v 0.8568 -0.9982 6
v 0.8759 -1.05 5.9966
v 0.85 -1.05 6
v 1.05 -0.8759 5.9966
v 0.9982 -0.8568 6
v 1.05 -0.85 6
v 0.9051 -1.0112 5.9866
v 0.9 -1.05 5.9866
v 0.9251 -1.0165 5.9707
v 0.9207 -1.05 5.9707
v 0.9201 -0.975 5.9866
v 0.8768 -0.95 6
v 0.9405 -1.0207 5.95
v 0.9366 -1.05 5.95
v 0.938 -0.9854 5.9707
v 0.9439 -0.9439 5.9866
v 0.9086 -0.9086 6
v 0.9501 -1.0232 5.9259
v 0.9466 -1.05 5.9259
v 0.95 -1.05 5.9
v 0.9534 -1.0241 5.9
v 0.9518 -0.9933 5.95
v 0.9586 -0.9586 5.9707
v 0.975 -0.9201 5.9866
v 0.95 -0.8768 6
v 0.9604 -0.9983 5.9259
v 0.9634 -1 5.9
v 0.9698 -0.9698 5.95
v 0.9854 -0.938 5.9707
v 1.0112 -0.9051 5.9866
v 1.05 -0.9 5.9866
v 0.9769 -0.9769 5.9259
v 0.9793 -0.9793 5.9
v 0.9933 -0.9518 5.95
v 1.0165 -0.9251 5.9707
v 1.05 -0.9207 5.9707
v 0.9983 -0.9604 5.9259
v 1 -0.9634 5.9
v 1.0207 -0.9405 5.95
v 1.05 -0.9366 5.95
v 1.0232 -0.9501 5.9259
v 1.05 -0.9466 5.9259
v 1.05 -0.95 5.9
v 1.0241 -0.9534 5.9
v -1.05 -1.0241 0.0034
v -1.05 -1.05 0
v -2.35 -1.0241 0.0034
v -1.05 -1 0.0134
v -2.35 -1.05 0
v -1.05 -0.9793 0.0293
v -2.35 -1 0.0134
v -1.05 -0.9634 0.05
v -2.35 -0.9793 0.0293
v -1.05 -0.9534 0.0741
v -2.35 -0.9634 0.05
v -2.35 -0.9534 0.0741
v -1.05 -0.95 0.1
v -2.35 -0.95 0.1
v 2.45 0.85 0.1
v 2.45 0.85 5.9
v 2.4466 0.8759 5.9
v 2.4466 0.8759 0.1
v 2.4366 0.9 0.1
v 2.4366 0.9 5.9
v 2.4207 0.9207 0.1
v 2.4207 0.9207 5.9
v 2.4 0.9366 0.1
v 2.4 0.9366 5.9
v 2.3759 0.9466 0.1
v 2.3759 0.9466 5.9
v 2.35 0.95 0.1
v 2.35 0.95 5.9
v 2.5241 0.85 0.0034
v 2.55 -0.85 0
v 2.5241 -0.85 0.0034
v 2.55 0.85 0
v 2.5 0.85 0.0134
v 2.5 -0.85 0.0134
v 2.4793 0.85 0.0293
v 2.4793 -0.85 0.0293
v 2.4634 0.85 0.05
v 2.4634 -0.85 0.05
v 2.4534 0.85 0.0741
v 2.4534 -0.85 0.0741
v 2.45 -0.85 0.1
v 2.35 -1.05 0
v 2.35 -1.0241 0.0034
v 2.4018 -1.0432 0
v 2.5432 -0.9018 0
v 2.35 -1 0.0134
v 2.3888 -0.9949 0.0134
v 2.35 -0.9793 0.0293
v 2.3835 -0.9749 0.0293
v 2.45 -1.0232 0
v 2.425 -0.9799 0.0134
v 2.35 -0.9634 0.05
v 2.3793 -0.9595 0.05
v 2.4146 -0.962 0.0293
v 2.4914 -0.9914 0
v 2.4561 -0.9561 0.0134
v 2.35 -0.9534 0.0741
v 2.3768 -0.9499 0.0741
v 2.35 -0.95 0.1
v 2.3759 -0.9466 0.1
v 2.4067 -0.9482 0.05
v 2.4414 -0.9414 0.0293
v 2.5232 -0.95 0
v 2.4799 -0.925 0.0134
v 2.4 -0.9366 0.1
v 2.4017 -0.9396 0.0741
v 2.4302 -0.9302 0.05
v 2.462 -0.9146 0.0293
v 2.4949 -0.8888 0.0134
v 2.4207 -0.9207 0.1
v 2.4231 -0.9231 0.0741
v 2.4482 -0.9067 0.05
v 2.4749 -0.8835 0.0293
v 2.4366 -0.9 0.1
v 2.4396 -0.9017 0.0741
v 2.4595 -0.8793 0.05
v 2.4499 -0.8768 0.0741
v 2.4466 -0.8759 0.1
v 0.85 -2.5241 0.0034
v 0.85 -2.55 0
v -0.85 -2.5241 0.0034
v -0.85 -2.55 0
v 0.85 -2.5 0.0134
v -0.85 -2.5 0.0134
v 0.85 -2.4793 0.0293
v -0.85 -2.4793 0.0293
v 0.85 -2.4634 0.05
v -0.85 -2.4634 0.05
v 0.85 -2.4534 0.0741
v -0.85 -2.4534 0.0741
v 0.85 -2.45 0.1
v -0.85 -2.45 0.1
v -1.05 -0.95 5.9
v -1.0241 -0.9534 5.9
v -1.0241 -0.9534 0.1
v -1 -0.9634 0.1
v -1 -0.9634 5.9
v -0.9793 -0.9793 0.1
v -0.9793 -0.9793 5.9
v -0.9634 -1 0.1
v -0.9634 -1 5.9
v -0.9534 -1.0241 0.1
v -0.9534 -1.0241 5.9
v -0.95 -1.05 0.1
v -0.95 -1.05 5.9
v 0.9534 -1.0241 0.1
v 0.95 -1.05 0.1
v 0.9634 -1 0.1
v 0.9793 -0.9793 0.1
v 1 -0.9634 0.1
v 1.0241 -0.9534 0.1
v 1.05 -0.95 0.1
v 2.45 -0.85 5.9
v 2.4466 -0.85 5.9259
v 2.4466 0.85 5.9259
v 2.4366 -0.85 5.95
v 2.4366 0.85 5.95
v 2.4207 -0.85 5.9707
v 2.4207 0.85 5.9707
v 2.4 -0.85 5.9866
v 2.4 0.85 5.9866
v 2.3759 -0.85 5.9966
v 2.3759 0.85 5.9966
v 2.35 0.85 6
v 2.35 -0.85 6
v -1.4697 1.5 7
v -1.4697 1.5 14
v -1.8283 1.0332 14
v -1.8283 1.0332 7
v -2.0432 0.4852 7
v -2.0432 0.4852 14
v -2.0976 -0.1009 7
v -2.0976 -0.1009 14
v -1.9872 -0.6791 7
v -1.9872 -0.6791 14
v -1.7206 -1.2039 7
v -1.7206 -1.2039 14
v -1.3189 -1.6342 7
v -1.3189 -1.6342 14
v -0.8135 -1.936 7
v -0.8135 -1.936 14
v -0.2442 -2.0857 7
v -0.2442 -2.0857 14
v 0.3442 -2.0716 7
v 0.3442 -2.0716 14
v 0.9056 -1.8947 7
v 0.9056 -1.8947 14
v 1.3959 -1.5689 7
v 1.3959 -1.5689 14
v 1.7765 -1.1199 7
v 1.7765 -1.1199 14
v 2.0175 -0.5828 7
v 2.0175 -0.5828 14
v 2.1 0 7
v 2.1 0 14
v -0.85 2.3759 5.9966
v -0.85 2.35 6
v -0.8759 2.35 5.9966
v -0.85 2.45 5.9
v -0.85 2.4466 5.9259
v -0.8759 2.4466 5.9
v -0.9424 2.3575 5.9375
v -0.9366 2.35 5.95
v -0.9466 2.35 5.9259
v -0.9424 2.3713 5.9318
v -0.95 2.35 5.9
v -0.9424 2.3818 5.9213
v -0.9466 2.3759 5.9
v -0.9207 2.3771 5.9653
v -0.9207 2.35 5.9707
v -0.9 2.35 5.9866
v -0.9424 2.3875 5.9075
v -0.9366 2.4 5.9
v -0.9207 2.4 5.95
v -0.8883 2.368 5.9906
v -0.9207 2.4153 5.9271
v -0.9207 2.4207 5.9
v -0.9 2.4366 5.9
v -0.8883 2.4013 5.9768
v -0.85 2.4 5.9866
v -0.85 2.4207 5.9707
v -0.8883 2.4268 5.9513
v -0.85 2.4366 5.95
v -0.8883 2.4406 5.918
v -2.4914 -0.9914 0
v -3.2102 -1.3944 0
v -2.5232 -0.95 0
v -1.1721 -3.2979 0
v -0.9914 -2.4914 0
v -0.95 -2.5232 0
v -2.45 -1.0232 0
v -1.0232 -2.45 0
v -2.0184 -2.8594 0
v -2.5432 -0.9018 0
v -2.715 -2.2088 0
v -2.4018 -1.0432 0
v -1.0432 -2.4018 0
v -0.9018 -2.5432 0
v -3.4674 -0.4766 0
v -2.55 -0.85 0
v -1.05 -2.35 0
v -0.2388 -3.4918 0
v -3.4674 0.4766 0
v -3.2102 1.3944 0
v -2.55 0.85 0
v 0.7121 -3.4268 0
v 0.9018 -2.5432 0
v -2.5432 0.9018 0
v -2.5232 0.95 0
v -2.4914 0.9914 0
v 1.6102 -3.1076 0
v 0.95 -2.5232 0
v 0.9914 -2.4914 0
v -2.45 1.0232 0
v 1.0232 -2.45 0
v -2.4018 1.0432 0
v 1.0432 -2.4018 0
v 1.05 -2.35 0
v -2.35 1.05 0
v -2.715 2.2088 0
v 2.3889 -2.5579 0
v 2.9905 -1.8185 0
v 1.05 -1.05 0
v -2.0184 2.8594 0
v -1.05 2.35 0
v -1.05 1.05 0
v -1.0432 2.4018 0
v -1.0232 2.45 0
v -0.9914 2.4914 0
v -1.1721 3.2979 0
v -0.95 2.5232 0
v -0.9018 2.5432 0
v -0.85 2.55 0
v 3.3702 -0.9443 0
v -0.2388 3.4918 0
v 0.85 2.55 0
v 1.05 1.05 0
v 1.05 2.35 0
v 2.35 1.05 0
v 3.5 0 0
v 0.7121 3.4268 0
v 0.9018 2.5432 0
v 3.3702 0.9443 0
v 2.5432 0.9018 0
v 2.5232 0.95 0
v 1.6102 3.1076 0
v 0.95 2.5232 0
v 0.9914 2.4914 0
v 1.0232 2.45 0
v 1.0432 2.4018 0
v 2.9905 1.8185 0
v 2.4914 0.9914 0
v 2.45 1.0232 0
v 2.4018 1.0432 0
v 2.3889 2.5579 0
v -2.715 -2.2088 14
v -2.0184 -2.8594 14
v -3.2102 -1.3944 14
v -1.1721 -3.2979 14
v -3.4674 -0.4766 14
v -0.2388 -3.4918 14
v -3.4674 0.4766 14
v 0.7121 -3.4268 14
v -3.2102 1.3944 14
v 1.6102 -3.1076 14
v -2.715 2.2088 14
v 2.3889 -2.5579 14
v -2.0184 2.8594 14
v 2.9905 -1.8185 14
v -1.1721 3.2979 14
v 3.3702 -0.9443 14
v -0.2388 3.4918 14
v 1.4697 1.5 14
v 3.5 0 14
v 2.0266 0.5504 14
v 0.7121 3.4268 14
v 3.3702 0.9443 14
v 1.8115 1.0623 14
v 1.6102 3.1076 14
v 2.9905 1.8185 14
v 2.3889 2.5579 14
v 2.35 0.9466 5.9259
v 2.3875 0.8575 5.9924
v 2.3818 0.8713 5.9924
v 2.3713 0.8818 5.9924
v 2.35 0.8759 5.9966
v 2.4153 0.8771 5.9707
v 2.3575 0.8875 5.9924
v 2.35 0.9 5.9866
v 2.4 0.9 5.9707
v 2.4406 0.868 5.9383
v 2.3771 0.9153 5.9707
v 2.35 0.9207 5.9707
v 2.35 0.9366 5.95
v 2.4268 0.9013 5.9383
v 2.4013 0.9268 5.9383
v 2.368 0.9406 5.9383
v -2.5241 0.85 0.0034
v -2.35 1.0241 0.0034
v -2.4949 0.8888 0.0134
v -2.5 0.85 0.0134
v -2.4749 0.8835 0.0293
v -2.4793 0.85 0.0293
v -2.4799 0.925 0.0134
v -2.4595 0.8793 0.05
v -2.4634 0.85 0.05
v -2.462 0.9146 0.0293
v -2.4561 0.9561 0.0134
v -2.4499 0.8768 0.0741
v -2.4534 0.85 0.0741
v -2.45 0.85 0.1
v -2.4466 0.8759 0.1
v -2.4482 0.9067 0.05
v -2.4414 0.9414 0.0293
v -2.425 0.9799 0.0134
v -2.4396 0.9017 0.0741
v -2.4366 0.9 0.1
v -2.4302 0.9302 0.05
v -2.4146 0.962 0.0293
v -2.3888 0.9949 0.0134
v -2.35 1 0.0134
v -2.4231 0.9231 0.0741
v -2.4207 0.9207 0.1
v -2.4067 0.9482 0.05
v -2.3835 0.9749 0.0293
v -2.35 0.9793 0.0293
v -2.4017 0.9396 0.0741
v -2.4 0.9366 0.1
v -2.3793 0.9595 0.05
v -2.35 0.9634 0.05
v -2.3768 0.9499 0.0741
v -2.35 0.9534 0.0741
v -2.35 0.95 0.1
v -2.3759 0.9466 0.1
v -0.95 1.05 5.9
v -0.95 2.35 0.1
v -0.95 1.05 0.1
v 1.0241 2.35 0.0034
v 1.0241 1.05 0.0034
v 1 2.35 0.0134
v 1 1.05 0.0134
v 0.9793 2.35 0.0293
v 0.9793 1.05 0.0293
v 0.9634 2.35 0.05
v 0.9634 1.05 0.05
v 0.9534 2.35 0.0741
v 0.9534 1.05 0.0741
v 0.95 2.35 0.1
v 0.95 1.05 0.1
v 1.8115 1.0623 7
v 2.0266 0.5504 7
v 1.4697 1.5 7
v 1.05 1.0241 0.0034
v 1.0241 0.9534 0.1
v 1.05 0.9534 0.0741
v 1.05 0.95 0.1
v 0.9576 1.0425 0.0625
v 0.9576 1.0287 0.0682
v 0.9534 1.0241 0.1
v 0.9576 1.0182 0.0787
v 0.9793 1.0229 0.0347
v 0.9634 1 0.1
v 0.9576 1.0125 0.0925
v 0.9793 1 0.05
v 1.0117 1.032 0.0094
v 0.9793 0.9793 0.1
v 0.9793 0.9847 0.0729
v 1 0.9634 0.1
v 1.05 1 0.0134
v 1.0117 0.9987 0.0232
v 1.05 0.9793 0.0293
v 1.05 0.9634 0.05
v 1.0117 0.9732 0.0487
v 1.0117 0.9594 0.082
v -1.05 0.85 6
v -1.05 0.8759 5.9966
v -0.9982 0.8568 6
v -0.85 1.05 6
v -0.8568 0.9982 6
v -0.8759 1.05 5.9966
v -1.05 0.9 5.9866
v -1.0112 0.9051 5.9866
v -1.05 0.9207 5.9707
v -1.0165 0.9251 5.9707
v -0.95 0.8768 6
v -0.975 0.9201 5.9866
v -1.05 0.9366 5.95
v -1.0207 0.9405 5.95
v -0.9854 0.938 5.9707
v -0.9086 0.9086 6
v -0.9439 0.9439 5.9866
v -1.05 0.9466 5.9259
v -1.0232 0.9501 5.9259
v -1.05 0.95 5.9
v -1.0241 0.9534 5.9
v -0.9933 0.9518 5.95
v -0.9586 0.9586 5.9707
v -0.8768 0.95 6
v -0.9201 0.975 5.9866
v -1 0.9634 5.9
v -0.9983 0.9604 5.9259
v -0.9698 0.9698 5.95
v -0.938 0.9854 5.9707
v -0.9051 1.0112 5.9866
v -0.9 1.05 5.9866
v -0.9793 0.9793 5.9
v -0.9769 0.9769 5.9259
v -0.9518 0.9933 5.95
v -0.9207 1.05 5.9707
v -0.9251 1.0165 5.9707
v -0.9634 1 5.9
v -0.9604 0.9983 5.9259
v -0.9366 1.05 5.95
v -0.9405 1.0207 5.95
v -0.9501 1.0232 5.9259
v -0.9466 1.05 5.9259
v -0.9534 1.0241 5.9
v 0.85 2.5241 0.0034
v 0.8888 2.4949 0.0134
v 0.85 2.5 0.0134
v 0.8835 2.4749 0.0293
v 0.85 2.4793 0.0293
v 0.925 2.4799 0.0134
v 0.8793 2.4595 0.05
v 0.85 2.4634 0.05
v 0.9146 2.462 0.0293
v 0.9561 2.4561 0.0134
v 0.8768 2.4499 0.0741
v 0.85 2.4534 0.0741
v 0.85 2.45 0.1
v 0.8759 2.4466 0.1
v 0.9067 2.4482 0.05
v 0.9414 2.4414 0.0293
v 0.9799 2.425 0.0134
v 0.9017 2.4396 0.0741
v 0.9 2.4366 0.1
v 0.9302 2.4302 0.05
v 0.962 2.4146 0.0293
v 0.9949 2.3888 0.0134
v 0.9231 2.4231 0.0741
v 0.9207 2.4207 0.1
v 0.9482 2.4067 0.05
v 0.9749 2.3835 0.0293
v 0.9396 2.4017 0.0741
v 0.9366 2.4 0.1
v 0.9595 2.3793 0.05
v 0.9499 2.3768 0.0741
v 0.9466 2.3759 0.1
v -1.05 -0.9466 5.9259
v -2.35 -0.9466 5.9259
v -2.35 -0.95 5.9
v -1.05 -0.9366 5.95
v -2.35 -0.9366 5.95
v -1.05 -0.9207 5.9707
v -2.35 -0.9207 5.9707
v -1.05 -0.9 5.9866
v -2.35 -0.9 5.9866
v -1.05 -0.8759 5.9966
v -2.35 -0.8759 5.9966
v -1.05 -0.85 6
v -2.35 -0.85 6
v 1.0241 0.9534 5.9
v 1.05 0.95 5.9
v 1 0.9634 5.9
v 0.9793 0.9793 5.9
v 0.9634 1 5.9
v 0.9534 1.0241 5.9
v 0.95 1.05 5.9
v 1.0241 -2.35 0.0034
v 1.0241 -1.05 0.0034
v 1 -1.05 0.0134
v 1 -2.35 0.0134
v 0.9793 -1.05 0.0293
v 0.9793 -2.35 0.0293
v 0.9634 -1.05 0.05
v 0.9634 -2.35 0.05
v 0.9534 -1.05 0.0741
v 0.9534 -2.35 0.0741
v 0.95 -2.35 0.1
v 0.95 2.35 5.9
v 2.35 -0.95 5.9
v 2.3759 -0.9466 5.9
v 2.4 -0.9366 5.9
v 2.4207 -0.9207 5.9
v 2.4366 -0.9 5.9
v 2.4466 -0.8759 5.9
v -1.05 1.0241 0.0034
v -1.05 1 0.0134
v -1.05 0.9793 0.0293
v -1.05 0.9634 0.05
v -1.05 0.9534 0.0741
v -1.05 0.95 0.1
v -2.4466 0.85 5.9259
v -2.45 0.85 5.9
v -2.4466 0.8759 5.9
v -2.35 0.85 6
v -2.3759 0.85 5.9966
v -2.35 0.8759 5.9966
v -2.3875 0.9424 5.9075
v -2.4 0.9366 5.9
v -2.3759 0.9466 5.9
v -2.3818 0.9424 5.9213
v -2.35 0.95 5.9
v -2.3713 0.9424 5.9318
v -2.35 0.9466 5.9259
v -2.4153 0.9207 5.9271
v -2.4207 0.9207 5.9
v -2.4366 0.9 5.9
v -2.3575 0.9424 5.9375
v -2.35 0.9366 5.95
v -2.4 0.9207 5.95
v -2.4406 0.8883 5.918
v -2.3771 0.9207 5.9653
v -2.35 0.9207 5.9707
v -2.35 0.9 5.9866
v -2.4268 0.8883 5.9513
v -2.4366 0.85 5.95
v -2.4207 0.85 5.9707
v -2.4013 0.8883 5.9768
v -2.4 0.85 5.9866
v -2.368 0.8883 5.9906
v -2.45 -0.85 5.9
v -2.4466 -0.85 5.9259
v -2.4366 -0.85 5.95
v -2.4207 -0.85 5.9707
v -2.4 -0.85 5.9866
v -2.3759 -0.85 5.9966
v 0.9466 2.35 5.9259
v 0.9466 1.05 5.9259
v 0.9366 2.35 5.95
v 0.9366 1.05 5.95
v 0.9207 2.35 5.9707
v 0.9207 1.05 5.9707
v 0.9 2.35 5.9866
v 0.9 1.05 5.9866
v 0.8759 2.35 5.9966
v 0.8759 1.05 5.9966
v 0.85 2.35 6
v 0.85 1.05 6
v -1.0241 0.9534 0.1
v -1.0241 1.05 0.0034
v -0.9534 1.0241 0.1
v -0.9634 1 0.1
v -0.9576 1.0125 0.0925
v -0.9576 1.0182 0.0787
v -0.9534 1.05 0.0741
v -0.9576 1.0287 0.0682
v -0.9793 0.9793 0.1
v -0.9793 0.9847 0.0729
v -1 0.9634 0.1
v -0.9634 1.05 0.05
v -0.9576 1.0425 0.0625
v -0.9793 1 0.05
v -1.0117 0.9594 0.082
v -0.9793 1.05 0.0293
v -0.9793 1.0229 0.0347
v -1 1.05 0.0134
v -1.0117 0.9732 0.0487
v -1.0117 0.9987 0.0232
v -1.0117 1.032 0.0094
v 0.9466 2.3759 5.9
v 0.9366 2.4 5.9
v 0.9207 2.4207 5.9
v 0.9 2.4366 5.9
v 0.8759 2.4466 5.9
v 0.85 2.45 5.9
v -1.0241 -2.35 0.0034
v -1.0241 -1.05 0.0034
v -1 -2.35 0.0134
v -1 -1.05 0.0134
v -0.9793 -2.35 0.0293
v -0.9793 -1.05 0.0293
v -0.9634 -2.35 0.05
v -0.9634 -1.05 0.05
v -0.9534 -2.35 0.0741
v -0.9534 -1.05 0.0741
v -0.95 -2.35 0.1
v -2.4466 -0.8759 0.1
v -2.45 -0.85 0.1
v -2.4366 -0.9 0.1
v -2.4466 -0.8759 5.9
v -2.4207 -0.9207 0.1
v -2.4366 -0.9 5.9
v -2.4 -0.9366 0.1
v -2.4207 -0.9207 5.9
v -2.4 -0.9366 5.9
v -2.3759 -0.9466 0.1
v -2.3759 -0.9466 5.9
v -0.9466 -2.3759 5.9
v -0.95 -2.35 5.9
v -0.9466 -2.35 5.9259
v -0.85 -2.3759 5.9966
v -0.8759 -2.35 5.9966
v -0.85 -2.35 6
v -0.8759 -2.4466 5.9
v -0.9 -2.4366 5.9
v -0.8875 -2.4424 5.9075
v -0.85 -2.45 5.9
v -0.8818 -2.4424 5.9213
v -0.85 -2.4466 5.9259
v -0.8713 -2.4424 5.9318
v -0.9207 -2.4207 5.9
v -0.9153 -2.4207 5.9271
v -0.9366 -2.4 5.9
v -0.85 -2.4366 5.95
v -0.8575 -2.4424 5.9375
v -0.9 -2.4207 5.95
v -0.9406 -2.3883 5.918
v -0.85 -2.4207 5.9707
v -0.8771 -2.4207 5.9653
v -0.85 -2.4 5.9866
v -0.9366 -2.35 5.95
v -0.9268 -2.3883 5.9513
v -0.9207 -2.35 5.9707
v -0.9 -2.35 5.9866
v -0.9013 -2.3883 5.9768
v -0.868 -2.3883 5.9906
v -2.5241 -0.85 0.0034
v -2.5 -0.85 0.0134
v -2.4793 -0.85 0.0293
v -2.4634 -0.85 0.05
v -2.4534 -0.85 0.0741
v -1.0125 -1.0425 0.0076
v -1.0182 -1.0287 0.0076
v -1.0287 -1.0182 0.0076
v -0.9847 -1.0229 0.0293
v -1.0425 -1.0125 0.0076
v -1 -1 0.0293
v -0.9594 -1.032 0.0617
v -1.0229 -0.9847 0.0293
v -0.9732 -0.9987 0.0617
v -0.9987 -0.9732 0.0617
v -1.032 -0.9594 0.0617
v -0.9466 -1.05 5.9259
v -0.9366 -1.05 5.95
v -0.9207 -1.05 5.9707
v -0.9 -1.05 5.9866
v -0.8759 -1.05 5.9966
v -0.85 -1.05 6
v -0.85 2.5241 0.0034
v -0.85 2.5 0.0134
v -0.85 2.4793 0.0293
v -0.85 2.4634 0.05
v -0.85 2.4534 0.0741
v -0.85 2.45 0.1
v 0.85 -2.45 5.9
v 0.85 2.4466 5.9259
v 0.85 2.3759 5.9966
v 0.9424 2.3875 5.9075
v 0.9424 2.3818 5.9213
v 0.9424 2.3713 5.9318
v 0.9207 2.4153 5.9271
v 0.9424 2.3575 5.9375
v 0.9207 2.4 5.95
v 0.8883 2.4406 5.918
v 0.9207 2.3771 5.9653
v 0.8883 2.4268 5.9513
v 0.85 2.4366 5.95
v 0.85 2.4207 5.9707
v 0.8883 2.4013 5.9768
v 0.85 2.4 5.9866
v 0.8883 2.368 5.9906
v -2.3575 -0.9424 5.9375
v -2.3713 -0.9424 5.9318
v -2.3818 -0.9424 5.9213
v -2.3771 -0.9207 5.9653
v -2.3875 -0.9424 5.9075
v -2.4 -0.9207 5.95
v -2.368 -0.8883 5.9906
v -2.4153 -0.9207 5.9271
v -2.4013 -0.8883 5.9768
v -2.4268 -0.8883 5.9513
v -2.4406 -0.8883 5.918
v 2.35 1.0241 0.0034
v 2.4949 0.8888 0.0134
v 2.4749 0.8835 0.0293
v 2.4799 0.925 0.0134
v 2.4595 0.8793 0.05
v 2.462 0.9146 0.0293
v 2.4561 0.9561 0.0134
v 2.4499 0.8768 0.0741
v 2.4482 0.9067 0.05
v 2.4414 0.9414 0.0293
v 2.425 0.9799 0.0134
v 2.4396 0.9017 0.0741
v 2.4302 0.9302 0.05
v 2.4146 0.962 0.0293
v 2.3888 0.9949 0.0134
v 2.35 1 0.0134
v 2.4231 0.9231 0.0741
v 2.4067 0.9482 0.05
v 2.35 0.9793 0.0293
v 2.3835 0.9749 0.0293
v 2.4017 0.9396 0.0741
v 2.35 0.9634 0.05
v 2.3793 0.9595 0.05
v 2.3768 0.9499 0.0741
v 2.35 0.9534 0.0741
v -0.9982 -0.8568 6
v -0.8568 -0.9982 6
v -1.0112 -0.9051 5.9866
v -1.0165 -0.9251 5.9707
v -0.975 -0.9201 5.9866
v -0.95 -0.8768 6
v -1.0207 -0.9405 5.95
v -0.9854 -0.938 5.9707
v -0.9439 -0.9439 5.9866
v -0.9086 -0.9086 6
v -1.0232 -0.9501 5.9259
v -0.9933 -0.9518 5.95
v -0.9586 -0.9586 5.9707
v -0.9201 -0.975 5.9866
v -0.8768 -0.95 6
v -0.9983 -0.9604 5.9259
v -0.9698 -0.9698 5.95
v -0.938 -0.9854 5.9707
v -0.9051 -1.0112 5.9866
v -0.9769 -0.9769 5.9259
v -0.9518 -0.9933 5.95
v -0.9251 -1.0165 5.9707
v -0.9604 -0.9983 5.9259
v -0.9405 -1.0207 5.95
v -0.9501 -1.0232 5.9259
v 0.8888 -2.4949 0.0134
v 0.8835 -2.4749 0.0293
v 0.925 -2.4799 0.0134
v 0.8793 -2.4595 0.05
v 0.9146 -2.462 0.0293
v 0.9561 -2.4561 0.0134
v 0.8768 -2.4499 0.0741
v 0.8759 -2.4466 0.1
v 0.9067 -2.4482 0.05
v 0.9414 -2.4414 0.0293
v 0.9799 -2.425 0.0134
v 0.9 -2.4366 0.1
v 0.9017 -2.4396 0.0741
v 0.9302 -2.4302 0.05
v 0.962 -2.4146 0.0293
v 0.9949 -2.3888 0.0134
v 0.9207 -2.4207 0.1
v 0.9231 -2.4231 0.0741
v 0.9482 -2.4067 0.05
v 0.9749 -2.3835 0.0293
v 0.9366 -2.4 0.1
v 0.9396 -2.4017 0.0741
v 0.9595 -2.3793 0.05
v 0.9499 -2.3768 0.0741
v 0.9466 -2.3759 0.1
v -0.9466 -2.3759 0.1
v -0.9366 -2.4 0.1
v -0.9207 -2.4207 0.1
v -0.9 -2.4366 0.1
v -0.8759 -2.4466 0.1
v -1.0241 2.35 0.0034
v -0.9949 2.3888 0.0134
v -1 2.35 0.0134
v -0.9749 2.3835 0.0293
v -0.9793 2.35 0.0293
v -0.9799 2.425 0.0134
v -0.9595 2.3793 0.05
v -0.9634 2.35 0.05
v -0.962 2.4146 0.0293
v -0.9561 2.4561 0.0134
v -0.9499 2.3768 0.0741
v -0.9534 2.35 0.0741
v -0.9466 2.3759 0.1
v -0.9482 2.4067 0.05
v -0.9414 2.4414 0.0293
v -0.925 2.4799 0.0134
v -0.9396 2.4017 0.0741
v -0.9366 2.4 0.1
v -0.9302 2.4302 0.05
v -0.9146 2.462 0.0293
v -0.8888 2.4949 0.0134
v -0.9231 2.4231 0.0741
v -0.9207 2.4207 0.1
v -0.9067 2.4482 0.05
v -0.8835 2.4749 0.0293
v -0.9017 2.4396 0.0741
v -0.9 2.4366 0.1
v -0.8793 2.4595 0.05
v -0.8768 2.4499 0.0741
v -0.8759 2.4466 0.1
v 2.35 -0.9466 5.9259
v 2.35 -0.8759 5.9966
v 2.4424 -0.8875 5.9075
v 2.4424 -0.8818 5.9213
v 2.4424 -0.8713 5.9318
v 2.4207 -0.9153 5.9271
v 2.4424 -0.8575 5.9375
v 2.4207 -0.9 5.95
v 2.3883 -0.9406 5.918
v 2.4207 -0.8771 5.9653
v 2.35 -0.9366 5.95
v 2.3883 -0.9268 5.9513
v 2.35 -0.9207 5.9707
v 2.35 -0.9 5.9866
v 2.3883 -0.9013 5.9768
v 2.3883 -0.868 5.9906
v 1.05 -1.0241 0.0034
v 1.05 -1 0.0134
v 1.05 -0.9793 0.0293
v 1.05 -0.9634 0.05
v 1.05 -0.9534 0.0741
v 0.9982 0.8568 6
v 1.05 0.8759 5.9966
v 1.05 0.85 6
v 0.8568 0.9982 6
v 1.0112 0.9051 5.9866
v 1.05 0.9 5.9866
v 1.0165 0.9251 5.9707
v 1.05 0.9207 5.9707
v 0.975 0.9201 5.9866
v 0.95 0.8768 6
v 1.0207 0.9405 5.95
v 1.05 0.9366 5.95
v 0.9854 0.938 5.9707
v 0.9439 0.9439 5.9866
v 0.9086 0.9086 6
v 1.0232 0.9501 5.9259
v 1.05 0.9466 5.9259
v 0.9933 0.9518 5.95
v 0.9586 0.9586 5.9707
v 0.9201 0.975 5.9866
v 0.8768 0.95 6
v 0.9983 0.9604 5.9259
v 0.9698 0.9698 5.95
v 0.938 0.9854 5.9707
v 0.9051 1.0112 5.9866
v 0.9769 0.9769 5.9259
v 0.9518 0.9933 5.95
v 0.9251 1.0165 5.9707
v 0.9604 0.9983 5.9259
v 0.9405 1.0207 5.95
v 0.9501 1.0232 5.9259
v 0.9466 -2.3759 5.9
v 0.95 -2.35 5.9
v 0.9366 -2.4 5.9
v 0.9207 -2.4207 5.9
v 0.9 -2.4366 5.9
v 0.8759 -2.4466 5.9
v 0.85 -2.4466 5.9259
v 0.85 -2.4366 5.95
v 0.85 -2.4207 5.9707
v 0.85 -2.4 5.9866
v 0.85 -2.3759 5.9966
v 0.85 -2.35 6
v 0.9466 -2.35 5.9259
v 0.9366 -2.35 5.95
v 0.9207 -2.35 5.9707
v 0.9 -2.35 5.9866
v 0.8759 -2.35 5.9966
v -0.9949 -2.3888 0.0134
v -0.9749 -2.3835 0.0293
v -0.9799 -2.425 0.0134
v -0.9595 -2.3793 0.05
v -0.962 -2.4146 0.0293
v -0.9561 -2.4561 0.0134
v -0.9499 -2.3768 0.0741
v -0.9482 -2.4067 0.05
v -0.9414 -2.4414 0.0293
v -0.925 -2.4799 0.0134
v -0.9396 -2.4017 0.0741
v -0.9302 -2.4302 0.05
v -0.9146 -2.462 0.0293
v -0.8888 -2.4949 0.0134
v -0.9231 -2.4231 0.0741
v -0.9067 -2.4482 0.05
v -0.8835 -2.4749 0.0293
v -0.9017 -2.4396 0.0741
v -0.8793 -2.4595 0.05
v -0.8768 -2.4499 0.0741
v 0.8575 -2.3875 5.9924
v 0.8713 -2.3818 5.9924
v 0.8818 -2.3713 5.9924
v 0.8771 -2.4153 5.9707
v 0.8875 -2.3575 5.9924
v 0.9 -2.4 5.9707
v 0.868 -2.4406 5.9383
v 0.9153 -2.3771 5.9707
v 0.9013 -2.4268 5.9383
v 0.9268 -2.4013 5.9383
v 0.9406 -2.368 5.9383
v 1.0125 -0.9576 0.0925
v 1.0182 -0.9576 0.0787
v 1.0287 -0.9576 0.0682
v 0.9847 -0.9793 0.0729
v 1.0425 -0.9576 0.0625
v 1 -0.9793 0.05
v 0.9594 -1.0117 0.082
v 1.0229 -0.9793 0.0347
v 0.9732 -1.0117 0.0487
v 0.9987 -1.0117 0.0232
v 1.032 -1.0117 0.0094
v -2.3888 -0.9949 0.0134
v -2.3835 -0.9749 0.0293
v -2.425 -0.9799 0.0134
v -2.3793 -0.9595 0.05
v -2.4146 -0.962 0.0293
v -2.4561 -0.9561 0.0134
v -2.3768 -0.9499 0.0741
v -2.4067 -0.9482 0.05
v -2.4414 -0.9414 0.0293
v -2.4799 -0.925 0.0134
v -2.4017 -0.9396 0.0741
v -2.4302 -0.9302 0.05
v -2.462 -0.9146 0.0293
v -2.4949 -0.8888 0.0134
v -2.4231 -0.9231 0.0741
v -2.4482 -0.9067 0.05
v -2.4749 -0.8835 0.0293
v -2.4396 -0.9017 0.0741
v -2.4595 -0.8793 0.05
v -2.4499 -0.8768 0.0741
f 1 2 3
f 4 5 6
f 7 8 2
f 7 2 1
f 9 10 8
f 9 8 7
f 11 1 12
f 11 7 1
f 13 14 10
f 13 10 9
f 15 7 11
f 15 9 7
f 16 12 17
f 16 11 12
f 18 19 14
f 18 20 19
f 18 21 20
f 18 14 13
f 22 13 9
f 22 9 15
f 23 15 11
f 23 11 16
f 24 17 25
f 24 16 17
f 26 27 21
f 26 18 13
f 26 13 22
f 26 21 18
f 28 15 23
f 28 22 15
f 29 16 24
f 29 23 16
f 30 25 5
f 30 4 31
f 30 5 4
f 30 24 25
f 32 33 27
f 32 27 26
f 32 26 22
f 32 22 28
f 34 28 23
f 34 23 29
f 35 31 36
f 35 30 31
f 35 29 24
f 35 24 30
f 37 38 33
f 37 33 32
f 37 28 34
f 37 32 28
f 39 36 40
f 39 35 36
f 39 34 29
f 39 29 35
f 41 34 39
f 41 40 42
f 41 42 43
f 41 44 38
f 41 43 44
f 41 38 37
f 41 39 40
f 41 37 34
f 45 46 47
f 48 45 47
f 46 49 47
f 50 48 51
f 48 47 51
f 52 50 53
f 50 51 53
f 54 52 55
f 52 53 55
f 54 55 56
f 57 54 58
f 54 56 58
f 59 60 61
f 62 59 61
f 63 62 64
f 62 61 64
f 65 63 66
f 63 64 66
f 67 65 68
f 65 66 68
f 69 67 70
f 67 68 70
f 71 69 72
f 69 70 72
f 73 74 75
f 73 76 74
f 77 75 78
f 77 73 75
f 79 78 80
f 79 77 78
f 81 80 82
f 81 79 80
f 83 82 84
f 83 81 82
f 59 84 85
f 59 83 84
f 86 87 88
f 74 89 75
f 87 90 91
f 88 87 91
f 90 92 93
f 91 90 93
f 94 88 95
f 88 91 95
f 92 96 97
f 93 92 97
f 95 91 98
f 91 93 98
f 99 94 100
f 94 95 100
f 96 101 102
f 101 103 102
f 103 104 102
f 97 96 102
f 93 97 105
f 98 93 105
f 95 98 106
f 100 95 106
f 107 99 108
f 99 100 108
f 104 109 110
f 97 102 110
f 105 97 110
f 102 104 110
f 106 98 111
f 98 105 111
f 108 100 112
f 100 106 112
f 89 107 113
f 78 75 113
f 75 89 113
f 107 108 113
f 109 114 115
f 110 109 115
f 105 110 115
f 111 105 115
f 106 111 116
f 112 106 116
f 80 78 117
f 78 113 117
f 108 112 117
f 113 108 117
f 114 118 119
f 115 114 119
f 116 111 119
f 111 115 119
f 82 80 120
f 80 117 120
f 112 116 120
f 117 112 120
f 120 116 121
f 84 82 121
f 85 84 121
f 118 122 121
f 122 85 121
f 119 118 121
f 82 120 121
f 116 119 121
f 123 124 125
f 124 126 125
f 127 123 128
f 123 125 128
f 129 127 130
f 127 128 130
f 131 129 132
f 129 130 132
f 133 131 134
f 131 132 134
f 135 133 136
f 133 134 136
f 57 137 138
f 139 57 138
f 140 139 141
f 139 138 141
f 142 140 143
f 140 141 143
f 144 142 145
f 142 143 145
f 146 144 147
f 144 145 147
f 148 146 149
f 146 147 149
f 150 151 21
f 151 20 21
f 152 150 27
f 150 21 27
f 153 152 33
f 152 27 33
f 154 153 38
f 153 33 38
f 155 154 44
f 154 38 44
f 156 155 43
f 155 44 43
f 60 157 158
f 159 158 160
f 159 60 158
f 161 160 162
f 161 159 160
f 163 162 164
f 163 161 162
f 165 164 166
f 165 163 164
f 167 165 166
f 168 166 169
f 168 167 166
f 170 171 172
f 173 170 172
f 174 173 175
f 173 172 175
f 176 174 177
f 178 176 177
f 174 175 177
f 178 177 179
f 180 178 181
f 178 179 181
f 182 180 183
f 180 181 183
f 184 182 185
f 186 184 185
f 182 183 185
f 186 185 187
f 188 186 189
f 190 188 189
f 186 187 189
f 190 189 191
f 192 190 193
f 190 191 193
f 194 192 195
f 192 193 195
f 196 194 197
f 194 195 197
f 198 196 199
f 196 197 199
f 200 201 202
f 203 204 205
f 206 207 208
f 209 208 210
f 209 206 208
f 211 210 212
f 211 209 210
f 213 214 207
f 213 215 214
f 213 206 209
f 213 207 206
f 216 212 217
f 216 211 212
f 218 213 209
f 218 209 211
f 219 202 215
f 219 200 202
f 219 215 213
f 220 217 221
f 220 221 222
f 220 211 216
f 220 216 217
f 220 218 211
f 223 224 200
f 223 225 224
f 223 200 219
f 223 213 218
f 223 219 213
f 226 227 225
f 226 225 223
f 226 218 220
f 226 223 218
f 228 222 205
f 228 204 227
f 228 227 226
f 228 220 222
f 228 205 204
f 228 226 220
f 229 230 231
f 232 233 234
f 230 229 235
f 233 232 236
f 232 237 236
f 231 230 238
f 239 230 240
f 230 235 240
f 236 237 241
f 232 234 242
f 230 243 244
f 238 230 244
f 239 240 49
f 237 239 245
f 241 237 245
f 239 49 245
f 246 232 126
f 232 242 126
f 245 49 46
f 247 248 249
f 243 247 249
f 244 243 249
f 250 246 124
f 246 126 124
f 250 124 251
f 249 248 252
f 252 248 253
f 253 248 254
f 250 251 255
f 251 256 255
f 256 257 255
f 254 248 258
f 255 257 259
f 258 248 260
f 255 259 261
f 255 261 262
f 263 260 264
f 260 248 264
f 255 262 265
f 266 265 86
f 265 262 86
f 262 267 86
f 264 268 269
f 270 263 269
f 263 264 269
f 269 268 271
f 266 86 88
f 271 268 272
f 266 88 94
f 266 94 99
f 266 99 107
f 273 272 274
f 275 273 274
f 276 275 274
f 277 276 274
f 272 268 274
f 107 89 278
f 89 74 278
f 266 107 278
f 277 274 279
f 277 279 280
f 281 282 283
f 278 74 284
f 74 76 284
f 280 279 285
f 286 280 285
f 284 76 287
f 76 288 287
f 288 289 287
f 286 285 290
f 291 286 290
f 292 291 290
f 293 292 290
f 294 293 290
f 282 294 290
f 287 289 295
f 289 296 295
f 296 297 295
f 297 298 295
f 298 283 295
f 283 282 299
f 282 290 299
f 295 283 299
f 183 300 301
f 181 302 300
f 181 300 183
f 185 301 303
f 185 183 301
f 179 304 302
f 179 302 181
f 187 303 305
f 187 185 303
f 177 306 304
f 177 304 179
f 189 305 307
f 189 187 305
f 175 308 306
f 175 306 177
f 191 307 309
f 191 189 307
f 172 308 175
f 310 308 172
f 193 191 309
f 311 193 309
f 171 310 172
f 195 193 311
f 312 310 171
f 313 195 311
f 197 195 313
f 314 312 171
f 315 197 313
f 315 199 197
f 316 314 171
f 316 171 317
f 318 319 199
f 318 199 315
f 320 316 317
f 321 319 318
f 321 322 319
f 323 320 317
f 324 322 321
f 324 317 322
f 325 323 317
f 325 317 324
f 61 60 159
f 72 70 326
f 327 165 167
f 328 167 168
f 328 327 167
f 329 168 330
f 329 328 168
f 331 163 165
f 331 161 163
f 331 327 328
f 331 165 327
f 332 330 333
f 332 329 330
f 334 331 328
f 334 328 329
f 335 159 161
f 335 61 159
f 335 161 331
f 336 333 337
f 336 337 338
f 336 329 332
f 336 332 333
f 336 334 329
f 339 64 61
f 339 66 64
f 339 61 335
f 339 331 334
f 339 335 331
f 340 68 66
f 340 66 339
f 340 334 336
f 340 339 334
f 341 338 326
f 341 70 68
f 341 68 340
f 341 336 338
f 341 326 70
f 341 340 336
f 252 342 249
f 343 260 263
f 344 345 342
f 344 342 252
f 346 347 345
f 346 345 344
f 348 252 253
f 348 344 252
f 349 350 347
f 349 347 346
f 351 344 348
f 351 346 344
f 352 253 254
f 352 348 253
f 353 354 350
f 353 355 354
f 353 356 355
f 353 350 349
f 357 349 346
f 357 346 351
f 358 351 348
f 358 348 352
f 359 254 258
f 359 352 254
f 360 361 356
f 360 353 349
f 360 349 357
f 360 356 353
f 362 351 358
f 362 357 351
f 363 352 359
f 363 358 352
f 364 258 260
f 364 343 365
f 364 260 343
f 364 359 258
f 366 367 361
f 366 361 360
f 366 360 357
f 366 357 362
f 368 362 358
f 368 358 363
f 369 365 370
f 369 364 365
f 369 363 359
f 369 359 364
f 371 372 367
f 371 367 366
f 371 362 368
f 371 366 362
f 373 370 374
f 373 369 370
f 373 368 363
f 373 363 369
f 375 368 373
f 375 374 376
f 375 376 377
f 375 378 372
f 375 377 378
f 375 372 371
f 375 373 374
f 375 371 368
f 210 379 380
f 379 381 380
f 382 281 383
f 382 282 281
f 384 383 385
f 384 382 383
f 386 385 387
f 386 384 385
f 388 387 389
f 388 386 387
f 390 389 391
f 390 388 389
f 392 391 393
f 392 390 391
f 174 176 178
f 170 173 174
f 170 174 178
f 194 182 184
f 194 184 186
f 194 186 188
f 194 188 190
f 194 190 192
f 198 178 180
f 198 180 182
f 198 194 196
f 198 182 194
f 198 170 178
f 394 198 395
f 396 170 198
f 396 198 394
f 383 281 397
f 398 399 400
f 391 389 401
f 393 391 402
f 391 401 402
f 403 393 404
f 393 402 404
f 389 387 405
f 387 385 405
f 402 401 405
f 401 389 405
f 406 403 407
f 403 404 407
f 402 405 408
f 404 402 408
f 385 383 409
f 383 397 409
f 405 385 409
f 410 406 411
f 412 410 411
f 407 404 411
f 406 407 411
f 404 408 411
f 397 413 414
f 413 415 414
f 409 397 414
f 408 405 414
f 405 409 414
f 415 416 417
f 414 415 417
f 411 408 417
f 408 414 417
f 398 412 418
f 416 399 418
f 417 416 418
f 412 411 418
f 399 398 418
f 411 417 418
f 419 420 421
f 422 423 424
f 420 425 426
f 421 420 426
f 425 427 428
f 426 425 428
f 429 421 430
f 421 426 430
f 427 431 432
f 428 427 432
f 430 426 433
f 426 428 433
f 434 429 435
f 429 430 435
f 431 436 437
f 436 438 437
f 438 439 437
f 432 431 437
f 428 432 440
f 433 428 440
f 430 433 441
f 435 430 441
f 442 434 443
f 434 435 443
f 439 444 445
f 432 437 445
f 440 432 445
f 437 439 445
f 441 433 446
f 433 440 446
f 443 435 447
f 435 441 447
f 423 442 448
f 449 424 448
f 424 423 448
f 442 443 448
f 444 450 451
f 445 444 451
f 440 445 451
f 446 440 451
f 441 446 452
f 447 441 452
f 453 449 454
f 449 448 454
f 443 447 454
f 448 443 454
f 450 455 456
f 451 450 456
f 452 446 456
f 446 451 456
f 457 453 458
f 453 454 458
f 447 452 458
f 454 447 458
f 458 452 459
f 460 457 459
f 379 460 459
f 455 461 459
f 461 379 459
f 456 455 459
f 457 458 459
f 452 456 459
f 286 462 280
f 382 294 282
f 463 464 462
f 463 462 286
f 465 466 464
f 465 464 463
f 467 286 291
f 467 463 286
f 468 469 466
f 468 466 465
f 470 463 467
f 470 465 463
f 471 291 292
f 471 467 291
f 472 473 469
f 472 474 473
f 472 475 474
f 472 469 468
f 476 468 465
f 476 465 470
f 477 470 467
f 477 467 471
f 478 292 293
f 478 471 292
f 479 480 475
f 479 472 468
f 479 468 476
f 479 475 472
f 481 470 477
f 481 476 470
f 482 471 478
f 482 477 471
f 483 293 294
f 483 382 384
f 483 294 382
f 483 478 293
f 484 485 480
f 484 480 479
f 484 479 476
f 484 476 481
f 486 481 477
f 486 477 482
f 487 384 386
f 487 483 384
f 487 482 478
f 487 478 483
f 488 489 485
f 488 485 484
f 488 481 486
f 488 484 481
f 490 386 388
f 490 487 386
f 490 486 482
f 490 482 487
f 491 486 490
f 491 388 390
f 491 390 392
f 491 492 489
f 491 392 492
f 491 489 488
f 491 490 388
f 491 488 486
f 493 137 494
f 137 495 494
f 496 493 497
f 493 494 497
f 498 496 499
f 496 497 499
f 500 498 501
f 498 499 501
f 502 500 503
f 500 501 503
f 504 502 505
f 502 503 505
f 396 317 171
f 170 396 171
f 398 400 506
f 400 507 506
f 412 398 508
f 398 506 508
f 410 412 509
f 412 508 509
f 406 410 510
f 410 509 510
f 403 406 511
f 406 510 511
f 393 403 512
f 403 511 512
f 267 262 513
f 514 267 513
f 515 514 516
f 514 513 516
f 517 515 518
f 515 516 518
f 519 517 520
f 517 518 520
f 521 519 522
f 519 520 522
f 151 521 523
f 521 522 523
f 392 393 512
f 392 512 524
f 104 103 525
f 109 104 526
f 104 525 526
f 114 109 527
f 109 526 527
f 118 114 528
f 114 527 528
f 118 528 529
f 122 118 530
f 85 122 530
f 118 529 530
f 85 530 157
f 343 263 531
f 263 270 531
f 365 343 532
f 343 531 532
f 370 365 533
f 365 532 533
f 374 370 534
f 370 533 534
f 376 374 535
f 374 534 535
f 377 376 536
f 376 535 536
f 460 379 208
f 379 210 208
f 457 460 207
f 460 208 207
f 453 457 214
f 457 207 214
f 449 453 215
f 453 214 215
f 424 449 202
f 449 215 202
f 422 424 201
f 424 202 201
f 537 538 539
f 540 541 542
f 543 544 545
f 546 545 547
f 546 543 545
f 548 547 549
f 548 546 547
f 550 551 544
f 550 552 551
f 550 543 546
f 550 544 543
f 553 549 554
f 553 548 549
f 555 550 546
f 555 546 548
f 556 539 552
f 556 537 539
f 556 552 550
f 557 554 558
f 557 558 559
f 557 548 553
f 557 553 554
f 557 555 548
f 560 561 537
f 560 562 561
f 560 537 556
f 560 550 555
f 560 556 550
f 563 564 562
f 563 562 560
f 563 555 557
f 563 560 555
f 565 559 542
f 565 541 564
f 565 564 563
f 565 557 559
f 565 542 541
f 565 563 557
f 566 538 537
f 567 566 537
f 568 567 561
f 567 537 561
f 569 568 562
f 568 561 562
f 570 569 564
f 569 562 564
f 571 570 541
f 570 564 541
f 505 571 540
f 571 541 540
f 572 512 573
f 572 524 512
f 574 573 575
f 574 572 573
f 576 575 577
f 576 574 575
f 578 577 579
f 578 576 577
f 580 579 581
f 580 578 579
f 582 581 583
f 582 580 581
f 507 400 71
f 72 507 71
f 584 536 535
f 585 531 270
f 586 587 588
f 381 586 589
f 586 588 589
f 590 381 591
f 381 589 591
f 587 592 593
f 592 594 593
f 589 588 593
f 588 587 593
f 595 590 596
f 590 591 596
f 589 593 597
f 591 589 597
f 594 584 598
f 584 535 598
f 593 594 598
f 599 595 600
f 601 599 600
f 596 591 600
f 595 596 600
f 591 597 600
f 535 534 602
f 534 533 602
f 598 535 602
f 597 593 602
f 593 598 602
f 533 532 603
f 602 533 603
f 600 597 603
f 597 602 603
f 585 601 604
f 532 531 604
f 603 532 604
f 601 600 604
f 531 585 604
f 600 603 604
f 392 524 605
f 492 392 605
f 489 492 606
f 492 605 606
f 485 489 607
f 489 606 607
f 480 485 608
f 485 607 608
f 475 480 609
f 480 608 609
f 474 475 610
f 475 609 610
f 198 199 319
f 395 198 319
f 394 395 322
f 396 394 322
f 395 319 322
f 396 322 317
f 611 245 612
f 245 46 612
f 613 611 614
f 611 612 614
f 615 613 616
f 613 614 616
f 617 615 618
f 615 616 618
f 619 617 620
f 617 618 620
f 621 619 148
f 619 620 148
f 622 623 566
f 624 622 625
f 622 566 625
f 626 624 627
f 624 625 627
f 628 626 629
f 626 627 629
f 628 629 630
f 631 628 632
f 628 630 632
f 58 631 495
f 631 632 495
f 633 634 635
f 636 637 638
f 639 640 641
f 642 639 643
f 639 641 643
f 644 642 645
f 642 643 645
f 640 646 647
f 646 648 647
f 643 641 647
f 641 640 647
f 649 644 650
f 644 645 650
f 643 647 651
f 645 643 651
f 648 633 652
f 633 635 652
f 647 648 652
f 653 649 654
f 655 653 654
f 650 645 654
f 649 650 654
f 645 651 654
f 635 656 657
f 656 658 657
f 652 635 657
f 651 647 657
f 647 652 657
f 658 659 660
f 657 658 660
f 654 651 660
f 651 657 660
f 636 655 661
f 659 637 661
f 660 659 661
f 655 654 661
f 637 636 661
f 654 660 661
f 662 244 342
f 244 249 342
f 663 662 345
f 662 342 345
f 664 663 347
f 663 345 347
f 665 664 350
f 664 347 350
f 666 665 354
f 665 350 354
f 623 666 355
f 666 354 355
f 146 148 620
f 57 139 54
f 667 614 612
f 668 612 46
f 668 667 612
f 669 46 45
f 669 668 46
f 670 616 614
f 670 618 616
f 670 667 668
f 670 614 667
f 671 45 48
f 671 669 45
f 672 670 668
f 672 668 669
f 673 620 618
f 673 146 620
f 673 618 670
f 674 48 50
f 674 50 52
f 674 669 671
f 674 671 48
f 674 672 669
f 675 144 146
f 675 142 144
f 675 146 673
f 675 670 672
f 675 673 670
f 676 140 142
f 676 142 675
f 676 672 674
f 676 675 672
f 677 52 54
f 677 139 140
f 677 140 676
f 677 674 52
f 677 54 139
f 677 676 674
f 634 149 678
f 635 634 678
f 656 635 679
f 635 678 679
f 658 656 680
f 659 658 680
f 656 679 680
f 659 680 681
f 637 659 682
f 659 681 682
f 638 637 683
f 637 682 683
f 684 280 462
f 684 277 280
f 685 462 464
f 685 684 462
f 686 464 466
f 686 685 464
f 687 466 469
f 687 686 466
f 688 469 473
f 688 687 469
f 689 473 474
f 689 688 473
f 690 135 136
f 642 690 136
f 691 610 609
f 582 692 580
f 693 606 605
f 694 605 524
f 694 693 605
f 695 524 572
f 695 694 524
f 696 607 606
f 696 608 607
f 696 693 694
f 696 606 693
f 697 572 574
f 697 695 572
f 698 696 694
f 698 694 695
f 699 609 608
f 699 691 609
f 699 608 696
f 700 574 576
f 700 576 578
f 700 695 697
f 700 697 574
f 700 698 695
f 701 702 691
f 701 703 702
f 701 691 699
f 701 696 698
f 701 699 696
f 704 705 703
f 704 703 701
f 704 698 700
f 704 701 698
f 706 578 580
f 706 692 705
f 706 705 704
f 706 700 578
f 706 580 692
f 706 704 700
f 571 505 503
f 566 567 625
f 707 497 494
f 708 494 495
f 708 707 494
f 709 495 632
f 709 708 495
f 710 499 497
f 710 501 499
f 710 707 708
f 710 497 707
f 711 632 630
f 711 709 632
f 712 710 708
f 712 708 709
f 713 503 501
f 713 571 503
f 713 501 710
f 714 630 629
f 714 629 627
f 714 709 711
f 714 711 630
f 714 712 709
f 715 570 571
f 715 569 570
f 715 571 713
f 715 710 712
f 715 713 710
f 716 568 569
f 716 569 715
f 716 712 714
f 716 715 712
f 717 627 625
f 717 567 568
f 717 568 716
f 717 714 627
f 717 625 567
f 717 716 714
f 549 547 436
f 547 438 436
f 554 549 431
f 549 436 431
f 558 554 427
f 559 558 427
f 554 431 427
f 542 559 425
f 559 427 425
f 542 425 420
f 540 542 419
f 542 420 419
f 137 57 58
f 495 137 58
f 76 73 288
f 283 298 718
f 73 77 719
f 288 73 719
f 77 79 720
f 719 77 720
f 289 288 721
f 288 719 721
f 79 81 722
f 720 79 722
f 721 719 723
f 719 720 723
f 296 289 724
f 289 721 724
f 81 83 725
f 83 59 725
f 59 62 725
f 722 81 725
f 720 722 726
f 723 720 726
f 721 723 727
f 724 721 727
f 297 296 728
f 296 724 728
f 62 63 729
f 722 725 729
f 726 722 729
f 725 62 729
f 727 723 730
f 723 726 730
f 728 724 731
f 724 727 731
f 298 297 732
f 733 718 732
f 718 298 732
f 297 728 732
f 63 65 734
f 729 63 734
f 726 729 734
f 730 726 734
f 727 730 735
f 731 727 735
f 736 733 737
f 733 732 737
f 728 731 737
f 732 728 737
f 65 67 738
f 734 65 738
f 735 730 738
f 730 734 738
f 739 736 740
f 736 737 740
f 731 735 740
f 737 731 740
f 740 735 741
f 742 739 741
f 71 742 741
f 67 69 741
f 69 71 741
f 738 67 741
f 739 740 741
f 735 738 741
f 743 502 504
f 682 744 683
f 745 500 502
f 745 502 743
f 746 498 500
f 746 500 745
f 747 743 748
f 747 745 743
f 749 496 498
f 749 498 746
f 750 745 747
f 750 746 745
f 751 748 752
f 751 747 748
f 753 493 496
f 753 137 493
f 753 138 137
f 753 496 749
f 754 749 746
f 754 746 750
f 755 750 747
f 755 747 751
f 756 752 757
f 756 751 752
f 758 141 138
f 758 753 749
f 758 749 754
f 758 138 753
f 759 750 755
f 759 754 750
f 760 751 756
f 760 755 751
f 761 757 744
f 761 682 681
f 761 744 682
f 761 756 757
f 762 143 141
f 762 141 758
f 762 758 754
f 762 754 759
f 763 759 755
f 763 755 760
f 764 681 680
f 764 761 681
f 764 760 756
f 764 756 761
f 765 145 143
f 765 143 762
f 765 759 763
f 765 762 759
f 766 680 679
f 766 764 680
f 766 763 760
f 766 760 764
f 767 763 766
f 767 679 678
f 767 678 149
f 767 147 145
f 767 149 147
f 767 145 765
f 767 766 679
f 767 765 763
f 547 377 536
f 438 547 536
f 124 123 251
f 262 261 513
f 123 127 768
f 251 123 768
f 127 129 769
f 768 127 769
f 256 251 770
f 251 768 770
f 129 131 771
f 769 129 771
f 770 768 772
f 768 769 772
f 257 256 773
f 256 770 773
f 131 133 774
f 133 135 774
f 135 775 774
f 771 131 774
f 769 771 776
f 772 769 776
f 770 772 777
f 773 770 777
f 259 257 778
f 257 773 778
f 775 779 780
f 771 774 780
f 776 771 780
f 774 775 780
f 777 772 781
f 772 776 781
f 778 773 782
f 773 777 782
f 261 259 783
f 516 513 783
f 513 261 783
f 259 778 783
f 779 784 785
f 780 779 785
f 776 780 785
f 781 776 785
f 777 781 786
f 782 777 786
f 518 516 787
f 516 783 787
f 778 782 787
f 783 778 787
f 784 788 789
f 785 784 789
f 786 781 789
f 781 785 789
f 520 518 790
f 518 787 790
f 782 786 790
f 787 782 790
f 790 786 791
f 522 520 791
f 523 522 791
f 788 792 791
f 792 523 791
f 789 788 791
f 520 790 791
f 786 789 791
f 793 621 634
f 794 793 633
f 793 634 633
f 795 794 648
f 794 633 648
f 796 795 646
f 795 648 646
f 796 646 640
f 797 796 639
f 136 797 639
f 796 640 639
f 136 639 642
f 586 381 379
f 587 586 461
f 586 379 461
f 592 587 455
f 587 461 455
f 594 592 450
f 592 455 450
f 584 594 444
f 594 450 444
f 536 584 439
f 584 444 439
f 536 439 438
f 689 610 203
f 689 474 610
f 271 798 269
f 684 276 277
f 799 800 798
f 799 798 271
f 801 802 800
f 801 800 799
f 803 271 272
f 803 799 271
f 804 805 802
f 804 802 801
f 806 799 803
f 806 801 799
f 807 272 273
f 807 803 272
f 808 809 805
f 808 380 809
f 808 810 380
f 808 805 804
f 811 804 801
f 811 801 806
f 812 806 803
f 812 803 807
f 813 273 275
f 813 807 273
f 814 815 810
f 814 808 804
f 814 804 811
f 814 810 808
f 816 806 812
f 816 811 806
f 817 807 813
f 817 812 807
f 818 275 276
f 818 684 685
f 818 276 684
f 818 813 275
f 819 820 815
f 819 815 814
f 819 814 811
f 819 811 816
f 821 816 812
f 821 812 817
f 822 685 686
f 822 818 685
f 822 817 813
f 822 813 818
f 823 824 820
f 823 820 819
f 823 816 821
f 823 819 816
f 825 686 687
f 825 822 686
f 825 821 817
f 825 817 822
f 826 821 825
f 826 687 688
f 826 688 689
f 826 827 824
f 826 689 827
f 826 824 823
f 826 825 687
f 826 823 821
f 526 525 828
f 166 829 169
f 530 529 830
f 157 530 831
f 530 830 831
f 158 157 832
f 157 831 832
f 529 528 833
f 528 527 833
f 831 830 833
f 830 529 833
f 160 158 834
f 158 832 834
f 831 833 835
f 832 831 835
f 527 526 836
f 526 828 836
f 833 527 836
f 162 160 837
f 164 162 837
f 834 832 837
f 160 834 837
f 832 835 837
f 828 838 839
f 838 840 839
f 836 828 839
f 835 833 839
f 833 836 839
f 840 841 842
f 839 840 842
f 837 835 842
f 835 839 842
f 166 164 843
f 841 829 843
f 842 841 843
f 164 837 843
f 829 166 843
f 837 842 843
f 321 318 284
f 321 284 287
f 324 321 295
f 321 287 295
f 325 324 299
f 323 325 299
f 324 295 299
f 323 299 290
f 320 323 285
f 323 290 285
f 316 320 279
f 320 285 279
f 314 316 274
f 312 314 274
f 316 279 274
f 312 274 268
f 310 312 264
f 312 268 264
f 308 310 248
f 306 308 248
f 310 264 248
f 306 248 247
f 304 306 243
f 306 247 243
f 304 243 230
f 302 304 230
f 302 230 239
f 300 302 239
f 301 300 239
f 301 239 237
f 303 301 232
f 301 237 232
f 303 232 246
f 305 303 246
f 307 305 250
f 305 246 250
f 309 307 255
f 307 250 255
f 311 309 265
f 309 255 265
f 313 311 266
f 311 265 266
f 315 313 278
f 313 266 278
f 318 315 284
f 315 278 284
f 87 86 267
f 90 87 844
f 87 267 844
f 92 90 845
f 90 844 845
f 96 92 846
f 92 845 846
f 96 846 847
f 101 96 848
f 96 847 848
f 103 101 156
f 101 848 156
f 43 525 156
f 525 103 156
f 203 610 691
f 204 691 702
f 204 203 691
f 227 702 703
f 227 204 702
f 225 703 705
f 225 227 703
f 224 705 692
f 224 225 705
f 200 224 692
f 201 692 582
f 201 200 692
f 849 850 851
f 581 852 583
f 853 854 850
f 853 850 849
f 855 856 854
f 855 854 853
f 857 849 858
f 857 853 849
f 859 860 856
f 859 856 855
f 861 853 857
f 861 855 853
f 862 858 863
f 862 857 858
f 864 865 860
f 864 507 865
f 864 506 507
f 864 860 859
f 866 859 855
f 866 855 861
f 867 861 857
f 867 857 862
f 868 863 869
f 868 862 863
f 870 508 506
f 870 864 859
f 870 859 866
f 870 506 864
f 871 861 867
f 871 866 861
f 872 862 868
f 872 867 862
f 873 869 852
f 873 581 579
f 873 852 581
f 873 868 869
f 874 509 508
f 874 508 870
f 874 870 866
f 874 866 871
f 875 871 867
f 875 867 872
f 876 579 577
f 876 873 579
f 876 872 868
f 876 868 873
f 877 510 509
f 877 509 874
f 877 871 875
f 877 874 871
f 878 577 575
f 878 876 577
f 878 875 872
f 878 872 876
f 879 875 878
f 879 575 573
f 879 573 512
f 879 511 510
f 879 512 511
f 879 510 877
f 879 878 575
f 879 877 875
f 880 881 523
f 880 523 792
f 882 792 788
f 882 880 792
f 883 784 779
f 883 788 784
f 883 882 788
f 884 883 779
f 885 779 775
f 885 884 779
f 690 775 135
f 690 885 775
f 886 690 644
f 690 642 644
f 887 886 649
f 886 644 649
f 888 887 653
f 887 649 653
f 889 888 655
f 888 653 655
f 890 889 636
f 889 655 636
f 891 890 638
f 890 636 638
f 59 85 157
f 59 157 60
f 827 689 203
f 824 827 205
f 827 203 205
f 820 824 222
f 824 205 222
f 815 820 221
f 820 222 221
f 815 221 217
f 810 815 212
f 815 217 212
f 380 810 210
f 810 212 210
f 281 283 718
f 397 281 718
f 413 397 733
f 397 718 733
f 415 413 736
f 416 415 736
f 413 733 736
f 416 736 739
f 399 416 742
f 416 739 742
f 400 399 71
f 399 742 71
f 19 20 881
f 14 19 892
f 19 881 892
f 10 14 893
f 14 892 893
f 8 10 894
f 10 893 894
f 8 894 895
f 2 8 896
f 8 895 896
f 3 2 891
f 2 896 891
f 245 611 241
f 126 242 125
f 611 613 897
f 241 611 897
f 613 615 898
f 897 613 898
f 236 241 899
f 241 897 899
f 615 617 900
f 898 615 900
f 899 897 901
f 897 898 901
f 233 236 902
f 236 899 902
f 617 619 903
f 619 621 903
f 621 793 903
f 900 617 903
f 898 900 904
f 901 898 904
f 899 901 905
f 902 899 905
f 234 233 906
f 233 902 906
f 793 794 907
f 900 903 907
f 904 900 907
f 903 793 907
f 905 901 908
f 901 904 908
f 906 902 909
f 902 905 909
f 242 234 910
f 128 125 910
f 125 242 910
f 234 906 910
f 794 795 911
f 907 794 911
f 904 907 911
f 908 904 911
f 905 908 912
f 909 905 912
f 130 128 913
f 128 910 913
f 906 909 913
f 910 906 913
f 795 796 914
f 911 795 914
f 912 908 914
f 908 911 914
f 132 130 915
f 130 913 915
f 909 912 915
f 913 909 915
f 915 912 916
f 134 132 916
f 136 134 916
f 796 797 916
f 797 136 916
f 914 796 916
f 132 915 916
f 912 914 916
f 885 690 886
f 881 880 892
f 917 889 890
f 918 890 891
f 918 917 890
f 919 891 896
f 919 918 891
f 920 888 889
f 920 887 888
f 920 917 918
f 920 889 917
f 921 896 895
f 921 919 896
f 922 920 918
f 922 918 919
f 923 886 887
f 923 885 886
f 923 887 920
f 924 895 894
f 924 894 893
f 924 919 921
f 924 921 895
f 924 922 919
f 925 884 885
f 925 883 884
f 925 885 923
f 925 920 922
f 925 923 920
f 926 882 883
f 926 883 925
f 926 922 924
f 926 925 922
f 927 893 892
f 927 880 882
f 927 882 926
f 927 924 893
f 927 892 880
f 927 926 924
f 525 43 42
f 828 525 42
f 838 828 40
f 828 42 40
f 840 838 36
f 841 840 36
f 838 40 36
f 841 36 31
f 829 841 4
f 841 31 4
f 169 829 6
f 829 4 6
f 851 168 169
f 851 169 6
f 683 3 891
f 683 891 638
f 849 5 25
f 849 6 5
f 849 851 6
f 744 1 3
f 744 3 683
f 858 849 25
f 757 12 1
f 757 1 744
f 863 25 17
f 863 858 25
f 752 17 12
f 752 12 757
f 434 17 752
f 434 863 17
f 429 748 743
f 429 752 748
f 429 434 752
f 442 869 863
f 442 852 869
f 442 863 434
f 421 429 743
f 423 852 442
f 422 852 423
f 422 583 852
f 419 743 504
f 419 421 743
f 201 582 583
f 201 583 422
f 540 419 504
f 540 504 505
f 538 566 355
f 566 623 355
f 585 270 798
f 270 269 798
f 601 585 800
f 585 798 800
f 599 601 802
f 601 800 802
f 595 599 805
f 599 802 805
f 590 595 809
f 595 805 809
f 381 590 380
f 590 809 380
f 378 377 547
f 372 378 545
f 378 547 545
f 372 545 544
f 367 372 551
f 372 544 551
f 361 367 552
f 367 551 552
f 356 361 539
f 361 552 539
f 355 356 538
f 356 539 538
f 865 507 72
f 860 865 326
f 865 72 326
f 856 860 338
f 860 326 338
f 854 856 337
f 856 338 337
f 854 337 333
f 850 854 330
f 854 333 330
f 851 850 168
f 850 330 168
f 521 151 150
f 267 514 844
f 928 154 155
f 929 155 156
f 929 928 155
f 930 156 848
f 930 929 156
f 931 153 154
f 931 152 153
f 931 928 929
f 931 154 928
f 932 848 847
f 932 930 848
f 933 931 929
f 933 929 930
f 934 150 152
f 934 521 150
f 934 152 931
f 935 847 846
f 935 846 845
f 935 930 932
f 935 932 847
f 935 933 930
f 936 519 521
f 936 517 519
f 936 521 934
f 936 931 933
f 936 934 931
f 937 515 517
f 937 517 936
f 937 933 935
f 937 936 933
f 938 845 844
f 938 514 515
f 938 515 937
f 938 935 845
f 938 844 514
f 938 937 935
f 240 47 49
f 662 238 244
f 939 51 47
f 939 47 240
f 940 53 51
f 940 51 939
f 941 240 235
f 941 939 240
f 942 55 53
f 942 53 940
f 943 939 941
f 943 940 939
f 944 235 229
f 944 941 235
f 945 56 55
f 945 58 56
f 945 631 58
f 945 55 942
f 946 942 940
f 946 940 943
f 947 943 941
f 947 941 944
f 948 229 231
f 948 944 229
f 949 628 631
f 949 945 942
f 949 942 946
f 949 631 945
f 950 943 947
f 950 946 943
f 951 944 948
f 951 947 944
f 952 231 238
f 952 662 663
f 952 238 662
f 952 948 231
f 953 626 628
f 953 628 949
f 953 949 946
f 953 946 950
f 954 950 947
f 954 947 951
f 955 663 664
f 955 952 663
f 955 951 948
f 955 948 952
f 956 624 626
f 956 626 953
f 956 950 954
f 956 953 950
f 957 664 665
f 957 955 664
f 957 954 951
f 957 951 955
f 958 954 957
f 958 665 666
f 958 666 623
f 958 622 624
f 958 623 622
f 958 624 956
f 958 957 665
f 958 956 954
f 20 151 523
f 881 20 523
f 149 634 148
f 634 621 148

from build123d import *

# Parameters (mm, degrees)
SKETCH_1_R          = 3.5
EXTRUDE_1_DEPTH     = 14
CUT_EXTRUDE_1_DEPTH = 7
SKETCH_3_W          = 1.9
SKETCH_3_H          = 1.5
SKETCH_3_W_2        = 1.5
SKETCH_3_H_2        = 1.9
CUT_EXTRUDE_2_DEPTH = 6
FILLET_2_R          = 0.1


with BuildPart() as part:
    # 草图1 → 凸台-拉伸1 (new body)
    with BuildSketch(Plane.XY):
        Circle(SKETCH_1_R)
    extrude(amount=EXTRUDE_1_DEPTH)

    # 草图2 → 切除-拉伸1 (cut)
    with BuildSketch(Plane.XY.offset(14)):
        with BuildLine():
            Line((1.469693846, 1.5), (-1.469693846, 1.5))
            ThreePointArc((-1.469693846, 1.5), (-0.8135241, -1.936021317), (2.1, 0))
            ThreePointArc((2.1, 0), (1.936021317, 0.8135241), (1.469693846, 1.5))
        make_face()
    extrude(amount=-CUT_EXTRUDE_1_DEPTH, mode=Mode.SUBTRACT)

    # 草图3 → 切除-拉伸2 (cut)
    with BuildSketch(Plane(origin=(0, 0, 0), x_dir=(-1, 0, 0), z_dir=(0, 0, -1))):
        with Locations((0, -1.7)):
            Rectangle(SKETCH_3_W, SKETCH_3_H)
        with Locations((1.7, 0)):
            Rectangle(SKETCH_3_W_2, SKETCH_3_H_2)
        Rectangle(SKETCH_3_W, SKETCH_3_H_2)
        with Locations((-1.7, 0)):
            Rectangle(SKETCH_3_W_2, SKETCH_3_H_2)
        with Locations((0, 1.7)):
            Rectangle(SKETCH_3_W, SKETCH_3_H)
    extrude(amount=-CUT_EXTRUDE_2_DEPTH, mode=Mode.SUBTRACT)

    # 圆角2
    fillet_2_edges = [part.edges().sort_by_distance(p)[0] for p in [
        (-0.95, -1.7, 6),
        (-0.95, -0.95, 3),
        (0, -2.45, 0),
        (-0.95, -2.45, 3),
        (0.95, -1.7, 0),
        (0.95, -2.45, 3),
        (1.7, -0.95, 6),
        (0.95, -0.95, 3),
        (2.45, 0, 0),
        (2.45, -0.95, 3),
        (1.7, 0.95, 0),
        (2.45, 0.95, 3),
        (0.95, 1.7, 0),
        (0.95, 0.95, 3),
        (0, 2.45, 6),
        (0.95, 2.45, 3),
        (-0.95, 1.7, 6),
        (-0.95, 2.45, 3),
        (-1.7, 0.95, 0),
        (-0.95, 0.95, 3),
        (-2.45, 0, 6),
        (-2.45, 0.95, 3),
        (-1.7, -0.95, 6),
        (-2.45, -0.95, 3),
        (0, -2.45, 6),
        (0.95, -1.7, 6),
        (2.45, 0, 6),
        (1.7, 0.95, 6),
        (0.95, 1.7, 6),
        (-1.7, 0.95, 6),
        (-0.95, -1.7, 0),
        (-1.7, -0.95, 0),
        (-2.45, 0, 0),
        (-0.95, 1.7, 0),
        (0, 2.45, 0),
        (1.7, -0.95, 0),
    ]]
    fillet(fillet_2_edges, radius=FILLET_2_R)


solid = part.part
